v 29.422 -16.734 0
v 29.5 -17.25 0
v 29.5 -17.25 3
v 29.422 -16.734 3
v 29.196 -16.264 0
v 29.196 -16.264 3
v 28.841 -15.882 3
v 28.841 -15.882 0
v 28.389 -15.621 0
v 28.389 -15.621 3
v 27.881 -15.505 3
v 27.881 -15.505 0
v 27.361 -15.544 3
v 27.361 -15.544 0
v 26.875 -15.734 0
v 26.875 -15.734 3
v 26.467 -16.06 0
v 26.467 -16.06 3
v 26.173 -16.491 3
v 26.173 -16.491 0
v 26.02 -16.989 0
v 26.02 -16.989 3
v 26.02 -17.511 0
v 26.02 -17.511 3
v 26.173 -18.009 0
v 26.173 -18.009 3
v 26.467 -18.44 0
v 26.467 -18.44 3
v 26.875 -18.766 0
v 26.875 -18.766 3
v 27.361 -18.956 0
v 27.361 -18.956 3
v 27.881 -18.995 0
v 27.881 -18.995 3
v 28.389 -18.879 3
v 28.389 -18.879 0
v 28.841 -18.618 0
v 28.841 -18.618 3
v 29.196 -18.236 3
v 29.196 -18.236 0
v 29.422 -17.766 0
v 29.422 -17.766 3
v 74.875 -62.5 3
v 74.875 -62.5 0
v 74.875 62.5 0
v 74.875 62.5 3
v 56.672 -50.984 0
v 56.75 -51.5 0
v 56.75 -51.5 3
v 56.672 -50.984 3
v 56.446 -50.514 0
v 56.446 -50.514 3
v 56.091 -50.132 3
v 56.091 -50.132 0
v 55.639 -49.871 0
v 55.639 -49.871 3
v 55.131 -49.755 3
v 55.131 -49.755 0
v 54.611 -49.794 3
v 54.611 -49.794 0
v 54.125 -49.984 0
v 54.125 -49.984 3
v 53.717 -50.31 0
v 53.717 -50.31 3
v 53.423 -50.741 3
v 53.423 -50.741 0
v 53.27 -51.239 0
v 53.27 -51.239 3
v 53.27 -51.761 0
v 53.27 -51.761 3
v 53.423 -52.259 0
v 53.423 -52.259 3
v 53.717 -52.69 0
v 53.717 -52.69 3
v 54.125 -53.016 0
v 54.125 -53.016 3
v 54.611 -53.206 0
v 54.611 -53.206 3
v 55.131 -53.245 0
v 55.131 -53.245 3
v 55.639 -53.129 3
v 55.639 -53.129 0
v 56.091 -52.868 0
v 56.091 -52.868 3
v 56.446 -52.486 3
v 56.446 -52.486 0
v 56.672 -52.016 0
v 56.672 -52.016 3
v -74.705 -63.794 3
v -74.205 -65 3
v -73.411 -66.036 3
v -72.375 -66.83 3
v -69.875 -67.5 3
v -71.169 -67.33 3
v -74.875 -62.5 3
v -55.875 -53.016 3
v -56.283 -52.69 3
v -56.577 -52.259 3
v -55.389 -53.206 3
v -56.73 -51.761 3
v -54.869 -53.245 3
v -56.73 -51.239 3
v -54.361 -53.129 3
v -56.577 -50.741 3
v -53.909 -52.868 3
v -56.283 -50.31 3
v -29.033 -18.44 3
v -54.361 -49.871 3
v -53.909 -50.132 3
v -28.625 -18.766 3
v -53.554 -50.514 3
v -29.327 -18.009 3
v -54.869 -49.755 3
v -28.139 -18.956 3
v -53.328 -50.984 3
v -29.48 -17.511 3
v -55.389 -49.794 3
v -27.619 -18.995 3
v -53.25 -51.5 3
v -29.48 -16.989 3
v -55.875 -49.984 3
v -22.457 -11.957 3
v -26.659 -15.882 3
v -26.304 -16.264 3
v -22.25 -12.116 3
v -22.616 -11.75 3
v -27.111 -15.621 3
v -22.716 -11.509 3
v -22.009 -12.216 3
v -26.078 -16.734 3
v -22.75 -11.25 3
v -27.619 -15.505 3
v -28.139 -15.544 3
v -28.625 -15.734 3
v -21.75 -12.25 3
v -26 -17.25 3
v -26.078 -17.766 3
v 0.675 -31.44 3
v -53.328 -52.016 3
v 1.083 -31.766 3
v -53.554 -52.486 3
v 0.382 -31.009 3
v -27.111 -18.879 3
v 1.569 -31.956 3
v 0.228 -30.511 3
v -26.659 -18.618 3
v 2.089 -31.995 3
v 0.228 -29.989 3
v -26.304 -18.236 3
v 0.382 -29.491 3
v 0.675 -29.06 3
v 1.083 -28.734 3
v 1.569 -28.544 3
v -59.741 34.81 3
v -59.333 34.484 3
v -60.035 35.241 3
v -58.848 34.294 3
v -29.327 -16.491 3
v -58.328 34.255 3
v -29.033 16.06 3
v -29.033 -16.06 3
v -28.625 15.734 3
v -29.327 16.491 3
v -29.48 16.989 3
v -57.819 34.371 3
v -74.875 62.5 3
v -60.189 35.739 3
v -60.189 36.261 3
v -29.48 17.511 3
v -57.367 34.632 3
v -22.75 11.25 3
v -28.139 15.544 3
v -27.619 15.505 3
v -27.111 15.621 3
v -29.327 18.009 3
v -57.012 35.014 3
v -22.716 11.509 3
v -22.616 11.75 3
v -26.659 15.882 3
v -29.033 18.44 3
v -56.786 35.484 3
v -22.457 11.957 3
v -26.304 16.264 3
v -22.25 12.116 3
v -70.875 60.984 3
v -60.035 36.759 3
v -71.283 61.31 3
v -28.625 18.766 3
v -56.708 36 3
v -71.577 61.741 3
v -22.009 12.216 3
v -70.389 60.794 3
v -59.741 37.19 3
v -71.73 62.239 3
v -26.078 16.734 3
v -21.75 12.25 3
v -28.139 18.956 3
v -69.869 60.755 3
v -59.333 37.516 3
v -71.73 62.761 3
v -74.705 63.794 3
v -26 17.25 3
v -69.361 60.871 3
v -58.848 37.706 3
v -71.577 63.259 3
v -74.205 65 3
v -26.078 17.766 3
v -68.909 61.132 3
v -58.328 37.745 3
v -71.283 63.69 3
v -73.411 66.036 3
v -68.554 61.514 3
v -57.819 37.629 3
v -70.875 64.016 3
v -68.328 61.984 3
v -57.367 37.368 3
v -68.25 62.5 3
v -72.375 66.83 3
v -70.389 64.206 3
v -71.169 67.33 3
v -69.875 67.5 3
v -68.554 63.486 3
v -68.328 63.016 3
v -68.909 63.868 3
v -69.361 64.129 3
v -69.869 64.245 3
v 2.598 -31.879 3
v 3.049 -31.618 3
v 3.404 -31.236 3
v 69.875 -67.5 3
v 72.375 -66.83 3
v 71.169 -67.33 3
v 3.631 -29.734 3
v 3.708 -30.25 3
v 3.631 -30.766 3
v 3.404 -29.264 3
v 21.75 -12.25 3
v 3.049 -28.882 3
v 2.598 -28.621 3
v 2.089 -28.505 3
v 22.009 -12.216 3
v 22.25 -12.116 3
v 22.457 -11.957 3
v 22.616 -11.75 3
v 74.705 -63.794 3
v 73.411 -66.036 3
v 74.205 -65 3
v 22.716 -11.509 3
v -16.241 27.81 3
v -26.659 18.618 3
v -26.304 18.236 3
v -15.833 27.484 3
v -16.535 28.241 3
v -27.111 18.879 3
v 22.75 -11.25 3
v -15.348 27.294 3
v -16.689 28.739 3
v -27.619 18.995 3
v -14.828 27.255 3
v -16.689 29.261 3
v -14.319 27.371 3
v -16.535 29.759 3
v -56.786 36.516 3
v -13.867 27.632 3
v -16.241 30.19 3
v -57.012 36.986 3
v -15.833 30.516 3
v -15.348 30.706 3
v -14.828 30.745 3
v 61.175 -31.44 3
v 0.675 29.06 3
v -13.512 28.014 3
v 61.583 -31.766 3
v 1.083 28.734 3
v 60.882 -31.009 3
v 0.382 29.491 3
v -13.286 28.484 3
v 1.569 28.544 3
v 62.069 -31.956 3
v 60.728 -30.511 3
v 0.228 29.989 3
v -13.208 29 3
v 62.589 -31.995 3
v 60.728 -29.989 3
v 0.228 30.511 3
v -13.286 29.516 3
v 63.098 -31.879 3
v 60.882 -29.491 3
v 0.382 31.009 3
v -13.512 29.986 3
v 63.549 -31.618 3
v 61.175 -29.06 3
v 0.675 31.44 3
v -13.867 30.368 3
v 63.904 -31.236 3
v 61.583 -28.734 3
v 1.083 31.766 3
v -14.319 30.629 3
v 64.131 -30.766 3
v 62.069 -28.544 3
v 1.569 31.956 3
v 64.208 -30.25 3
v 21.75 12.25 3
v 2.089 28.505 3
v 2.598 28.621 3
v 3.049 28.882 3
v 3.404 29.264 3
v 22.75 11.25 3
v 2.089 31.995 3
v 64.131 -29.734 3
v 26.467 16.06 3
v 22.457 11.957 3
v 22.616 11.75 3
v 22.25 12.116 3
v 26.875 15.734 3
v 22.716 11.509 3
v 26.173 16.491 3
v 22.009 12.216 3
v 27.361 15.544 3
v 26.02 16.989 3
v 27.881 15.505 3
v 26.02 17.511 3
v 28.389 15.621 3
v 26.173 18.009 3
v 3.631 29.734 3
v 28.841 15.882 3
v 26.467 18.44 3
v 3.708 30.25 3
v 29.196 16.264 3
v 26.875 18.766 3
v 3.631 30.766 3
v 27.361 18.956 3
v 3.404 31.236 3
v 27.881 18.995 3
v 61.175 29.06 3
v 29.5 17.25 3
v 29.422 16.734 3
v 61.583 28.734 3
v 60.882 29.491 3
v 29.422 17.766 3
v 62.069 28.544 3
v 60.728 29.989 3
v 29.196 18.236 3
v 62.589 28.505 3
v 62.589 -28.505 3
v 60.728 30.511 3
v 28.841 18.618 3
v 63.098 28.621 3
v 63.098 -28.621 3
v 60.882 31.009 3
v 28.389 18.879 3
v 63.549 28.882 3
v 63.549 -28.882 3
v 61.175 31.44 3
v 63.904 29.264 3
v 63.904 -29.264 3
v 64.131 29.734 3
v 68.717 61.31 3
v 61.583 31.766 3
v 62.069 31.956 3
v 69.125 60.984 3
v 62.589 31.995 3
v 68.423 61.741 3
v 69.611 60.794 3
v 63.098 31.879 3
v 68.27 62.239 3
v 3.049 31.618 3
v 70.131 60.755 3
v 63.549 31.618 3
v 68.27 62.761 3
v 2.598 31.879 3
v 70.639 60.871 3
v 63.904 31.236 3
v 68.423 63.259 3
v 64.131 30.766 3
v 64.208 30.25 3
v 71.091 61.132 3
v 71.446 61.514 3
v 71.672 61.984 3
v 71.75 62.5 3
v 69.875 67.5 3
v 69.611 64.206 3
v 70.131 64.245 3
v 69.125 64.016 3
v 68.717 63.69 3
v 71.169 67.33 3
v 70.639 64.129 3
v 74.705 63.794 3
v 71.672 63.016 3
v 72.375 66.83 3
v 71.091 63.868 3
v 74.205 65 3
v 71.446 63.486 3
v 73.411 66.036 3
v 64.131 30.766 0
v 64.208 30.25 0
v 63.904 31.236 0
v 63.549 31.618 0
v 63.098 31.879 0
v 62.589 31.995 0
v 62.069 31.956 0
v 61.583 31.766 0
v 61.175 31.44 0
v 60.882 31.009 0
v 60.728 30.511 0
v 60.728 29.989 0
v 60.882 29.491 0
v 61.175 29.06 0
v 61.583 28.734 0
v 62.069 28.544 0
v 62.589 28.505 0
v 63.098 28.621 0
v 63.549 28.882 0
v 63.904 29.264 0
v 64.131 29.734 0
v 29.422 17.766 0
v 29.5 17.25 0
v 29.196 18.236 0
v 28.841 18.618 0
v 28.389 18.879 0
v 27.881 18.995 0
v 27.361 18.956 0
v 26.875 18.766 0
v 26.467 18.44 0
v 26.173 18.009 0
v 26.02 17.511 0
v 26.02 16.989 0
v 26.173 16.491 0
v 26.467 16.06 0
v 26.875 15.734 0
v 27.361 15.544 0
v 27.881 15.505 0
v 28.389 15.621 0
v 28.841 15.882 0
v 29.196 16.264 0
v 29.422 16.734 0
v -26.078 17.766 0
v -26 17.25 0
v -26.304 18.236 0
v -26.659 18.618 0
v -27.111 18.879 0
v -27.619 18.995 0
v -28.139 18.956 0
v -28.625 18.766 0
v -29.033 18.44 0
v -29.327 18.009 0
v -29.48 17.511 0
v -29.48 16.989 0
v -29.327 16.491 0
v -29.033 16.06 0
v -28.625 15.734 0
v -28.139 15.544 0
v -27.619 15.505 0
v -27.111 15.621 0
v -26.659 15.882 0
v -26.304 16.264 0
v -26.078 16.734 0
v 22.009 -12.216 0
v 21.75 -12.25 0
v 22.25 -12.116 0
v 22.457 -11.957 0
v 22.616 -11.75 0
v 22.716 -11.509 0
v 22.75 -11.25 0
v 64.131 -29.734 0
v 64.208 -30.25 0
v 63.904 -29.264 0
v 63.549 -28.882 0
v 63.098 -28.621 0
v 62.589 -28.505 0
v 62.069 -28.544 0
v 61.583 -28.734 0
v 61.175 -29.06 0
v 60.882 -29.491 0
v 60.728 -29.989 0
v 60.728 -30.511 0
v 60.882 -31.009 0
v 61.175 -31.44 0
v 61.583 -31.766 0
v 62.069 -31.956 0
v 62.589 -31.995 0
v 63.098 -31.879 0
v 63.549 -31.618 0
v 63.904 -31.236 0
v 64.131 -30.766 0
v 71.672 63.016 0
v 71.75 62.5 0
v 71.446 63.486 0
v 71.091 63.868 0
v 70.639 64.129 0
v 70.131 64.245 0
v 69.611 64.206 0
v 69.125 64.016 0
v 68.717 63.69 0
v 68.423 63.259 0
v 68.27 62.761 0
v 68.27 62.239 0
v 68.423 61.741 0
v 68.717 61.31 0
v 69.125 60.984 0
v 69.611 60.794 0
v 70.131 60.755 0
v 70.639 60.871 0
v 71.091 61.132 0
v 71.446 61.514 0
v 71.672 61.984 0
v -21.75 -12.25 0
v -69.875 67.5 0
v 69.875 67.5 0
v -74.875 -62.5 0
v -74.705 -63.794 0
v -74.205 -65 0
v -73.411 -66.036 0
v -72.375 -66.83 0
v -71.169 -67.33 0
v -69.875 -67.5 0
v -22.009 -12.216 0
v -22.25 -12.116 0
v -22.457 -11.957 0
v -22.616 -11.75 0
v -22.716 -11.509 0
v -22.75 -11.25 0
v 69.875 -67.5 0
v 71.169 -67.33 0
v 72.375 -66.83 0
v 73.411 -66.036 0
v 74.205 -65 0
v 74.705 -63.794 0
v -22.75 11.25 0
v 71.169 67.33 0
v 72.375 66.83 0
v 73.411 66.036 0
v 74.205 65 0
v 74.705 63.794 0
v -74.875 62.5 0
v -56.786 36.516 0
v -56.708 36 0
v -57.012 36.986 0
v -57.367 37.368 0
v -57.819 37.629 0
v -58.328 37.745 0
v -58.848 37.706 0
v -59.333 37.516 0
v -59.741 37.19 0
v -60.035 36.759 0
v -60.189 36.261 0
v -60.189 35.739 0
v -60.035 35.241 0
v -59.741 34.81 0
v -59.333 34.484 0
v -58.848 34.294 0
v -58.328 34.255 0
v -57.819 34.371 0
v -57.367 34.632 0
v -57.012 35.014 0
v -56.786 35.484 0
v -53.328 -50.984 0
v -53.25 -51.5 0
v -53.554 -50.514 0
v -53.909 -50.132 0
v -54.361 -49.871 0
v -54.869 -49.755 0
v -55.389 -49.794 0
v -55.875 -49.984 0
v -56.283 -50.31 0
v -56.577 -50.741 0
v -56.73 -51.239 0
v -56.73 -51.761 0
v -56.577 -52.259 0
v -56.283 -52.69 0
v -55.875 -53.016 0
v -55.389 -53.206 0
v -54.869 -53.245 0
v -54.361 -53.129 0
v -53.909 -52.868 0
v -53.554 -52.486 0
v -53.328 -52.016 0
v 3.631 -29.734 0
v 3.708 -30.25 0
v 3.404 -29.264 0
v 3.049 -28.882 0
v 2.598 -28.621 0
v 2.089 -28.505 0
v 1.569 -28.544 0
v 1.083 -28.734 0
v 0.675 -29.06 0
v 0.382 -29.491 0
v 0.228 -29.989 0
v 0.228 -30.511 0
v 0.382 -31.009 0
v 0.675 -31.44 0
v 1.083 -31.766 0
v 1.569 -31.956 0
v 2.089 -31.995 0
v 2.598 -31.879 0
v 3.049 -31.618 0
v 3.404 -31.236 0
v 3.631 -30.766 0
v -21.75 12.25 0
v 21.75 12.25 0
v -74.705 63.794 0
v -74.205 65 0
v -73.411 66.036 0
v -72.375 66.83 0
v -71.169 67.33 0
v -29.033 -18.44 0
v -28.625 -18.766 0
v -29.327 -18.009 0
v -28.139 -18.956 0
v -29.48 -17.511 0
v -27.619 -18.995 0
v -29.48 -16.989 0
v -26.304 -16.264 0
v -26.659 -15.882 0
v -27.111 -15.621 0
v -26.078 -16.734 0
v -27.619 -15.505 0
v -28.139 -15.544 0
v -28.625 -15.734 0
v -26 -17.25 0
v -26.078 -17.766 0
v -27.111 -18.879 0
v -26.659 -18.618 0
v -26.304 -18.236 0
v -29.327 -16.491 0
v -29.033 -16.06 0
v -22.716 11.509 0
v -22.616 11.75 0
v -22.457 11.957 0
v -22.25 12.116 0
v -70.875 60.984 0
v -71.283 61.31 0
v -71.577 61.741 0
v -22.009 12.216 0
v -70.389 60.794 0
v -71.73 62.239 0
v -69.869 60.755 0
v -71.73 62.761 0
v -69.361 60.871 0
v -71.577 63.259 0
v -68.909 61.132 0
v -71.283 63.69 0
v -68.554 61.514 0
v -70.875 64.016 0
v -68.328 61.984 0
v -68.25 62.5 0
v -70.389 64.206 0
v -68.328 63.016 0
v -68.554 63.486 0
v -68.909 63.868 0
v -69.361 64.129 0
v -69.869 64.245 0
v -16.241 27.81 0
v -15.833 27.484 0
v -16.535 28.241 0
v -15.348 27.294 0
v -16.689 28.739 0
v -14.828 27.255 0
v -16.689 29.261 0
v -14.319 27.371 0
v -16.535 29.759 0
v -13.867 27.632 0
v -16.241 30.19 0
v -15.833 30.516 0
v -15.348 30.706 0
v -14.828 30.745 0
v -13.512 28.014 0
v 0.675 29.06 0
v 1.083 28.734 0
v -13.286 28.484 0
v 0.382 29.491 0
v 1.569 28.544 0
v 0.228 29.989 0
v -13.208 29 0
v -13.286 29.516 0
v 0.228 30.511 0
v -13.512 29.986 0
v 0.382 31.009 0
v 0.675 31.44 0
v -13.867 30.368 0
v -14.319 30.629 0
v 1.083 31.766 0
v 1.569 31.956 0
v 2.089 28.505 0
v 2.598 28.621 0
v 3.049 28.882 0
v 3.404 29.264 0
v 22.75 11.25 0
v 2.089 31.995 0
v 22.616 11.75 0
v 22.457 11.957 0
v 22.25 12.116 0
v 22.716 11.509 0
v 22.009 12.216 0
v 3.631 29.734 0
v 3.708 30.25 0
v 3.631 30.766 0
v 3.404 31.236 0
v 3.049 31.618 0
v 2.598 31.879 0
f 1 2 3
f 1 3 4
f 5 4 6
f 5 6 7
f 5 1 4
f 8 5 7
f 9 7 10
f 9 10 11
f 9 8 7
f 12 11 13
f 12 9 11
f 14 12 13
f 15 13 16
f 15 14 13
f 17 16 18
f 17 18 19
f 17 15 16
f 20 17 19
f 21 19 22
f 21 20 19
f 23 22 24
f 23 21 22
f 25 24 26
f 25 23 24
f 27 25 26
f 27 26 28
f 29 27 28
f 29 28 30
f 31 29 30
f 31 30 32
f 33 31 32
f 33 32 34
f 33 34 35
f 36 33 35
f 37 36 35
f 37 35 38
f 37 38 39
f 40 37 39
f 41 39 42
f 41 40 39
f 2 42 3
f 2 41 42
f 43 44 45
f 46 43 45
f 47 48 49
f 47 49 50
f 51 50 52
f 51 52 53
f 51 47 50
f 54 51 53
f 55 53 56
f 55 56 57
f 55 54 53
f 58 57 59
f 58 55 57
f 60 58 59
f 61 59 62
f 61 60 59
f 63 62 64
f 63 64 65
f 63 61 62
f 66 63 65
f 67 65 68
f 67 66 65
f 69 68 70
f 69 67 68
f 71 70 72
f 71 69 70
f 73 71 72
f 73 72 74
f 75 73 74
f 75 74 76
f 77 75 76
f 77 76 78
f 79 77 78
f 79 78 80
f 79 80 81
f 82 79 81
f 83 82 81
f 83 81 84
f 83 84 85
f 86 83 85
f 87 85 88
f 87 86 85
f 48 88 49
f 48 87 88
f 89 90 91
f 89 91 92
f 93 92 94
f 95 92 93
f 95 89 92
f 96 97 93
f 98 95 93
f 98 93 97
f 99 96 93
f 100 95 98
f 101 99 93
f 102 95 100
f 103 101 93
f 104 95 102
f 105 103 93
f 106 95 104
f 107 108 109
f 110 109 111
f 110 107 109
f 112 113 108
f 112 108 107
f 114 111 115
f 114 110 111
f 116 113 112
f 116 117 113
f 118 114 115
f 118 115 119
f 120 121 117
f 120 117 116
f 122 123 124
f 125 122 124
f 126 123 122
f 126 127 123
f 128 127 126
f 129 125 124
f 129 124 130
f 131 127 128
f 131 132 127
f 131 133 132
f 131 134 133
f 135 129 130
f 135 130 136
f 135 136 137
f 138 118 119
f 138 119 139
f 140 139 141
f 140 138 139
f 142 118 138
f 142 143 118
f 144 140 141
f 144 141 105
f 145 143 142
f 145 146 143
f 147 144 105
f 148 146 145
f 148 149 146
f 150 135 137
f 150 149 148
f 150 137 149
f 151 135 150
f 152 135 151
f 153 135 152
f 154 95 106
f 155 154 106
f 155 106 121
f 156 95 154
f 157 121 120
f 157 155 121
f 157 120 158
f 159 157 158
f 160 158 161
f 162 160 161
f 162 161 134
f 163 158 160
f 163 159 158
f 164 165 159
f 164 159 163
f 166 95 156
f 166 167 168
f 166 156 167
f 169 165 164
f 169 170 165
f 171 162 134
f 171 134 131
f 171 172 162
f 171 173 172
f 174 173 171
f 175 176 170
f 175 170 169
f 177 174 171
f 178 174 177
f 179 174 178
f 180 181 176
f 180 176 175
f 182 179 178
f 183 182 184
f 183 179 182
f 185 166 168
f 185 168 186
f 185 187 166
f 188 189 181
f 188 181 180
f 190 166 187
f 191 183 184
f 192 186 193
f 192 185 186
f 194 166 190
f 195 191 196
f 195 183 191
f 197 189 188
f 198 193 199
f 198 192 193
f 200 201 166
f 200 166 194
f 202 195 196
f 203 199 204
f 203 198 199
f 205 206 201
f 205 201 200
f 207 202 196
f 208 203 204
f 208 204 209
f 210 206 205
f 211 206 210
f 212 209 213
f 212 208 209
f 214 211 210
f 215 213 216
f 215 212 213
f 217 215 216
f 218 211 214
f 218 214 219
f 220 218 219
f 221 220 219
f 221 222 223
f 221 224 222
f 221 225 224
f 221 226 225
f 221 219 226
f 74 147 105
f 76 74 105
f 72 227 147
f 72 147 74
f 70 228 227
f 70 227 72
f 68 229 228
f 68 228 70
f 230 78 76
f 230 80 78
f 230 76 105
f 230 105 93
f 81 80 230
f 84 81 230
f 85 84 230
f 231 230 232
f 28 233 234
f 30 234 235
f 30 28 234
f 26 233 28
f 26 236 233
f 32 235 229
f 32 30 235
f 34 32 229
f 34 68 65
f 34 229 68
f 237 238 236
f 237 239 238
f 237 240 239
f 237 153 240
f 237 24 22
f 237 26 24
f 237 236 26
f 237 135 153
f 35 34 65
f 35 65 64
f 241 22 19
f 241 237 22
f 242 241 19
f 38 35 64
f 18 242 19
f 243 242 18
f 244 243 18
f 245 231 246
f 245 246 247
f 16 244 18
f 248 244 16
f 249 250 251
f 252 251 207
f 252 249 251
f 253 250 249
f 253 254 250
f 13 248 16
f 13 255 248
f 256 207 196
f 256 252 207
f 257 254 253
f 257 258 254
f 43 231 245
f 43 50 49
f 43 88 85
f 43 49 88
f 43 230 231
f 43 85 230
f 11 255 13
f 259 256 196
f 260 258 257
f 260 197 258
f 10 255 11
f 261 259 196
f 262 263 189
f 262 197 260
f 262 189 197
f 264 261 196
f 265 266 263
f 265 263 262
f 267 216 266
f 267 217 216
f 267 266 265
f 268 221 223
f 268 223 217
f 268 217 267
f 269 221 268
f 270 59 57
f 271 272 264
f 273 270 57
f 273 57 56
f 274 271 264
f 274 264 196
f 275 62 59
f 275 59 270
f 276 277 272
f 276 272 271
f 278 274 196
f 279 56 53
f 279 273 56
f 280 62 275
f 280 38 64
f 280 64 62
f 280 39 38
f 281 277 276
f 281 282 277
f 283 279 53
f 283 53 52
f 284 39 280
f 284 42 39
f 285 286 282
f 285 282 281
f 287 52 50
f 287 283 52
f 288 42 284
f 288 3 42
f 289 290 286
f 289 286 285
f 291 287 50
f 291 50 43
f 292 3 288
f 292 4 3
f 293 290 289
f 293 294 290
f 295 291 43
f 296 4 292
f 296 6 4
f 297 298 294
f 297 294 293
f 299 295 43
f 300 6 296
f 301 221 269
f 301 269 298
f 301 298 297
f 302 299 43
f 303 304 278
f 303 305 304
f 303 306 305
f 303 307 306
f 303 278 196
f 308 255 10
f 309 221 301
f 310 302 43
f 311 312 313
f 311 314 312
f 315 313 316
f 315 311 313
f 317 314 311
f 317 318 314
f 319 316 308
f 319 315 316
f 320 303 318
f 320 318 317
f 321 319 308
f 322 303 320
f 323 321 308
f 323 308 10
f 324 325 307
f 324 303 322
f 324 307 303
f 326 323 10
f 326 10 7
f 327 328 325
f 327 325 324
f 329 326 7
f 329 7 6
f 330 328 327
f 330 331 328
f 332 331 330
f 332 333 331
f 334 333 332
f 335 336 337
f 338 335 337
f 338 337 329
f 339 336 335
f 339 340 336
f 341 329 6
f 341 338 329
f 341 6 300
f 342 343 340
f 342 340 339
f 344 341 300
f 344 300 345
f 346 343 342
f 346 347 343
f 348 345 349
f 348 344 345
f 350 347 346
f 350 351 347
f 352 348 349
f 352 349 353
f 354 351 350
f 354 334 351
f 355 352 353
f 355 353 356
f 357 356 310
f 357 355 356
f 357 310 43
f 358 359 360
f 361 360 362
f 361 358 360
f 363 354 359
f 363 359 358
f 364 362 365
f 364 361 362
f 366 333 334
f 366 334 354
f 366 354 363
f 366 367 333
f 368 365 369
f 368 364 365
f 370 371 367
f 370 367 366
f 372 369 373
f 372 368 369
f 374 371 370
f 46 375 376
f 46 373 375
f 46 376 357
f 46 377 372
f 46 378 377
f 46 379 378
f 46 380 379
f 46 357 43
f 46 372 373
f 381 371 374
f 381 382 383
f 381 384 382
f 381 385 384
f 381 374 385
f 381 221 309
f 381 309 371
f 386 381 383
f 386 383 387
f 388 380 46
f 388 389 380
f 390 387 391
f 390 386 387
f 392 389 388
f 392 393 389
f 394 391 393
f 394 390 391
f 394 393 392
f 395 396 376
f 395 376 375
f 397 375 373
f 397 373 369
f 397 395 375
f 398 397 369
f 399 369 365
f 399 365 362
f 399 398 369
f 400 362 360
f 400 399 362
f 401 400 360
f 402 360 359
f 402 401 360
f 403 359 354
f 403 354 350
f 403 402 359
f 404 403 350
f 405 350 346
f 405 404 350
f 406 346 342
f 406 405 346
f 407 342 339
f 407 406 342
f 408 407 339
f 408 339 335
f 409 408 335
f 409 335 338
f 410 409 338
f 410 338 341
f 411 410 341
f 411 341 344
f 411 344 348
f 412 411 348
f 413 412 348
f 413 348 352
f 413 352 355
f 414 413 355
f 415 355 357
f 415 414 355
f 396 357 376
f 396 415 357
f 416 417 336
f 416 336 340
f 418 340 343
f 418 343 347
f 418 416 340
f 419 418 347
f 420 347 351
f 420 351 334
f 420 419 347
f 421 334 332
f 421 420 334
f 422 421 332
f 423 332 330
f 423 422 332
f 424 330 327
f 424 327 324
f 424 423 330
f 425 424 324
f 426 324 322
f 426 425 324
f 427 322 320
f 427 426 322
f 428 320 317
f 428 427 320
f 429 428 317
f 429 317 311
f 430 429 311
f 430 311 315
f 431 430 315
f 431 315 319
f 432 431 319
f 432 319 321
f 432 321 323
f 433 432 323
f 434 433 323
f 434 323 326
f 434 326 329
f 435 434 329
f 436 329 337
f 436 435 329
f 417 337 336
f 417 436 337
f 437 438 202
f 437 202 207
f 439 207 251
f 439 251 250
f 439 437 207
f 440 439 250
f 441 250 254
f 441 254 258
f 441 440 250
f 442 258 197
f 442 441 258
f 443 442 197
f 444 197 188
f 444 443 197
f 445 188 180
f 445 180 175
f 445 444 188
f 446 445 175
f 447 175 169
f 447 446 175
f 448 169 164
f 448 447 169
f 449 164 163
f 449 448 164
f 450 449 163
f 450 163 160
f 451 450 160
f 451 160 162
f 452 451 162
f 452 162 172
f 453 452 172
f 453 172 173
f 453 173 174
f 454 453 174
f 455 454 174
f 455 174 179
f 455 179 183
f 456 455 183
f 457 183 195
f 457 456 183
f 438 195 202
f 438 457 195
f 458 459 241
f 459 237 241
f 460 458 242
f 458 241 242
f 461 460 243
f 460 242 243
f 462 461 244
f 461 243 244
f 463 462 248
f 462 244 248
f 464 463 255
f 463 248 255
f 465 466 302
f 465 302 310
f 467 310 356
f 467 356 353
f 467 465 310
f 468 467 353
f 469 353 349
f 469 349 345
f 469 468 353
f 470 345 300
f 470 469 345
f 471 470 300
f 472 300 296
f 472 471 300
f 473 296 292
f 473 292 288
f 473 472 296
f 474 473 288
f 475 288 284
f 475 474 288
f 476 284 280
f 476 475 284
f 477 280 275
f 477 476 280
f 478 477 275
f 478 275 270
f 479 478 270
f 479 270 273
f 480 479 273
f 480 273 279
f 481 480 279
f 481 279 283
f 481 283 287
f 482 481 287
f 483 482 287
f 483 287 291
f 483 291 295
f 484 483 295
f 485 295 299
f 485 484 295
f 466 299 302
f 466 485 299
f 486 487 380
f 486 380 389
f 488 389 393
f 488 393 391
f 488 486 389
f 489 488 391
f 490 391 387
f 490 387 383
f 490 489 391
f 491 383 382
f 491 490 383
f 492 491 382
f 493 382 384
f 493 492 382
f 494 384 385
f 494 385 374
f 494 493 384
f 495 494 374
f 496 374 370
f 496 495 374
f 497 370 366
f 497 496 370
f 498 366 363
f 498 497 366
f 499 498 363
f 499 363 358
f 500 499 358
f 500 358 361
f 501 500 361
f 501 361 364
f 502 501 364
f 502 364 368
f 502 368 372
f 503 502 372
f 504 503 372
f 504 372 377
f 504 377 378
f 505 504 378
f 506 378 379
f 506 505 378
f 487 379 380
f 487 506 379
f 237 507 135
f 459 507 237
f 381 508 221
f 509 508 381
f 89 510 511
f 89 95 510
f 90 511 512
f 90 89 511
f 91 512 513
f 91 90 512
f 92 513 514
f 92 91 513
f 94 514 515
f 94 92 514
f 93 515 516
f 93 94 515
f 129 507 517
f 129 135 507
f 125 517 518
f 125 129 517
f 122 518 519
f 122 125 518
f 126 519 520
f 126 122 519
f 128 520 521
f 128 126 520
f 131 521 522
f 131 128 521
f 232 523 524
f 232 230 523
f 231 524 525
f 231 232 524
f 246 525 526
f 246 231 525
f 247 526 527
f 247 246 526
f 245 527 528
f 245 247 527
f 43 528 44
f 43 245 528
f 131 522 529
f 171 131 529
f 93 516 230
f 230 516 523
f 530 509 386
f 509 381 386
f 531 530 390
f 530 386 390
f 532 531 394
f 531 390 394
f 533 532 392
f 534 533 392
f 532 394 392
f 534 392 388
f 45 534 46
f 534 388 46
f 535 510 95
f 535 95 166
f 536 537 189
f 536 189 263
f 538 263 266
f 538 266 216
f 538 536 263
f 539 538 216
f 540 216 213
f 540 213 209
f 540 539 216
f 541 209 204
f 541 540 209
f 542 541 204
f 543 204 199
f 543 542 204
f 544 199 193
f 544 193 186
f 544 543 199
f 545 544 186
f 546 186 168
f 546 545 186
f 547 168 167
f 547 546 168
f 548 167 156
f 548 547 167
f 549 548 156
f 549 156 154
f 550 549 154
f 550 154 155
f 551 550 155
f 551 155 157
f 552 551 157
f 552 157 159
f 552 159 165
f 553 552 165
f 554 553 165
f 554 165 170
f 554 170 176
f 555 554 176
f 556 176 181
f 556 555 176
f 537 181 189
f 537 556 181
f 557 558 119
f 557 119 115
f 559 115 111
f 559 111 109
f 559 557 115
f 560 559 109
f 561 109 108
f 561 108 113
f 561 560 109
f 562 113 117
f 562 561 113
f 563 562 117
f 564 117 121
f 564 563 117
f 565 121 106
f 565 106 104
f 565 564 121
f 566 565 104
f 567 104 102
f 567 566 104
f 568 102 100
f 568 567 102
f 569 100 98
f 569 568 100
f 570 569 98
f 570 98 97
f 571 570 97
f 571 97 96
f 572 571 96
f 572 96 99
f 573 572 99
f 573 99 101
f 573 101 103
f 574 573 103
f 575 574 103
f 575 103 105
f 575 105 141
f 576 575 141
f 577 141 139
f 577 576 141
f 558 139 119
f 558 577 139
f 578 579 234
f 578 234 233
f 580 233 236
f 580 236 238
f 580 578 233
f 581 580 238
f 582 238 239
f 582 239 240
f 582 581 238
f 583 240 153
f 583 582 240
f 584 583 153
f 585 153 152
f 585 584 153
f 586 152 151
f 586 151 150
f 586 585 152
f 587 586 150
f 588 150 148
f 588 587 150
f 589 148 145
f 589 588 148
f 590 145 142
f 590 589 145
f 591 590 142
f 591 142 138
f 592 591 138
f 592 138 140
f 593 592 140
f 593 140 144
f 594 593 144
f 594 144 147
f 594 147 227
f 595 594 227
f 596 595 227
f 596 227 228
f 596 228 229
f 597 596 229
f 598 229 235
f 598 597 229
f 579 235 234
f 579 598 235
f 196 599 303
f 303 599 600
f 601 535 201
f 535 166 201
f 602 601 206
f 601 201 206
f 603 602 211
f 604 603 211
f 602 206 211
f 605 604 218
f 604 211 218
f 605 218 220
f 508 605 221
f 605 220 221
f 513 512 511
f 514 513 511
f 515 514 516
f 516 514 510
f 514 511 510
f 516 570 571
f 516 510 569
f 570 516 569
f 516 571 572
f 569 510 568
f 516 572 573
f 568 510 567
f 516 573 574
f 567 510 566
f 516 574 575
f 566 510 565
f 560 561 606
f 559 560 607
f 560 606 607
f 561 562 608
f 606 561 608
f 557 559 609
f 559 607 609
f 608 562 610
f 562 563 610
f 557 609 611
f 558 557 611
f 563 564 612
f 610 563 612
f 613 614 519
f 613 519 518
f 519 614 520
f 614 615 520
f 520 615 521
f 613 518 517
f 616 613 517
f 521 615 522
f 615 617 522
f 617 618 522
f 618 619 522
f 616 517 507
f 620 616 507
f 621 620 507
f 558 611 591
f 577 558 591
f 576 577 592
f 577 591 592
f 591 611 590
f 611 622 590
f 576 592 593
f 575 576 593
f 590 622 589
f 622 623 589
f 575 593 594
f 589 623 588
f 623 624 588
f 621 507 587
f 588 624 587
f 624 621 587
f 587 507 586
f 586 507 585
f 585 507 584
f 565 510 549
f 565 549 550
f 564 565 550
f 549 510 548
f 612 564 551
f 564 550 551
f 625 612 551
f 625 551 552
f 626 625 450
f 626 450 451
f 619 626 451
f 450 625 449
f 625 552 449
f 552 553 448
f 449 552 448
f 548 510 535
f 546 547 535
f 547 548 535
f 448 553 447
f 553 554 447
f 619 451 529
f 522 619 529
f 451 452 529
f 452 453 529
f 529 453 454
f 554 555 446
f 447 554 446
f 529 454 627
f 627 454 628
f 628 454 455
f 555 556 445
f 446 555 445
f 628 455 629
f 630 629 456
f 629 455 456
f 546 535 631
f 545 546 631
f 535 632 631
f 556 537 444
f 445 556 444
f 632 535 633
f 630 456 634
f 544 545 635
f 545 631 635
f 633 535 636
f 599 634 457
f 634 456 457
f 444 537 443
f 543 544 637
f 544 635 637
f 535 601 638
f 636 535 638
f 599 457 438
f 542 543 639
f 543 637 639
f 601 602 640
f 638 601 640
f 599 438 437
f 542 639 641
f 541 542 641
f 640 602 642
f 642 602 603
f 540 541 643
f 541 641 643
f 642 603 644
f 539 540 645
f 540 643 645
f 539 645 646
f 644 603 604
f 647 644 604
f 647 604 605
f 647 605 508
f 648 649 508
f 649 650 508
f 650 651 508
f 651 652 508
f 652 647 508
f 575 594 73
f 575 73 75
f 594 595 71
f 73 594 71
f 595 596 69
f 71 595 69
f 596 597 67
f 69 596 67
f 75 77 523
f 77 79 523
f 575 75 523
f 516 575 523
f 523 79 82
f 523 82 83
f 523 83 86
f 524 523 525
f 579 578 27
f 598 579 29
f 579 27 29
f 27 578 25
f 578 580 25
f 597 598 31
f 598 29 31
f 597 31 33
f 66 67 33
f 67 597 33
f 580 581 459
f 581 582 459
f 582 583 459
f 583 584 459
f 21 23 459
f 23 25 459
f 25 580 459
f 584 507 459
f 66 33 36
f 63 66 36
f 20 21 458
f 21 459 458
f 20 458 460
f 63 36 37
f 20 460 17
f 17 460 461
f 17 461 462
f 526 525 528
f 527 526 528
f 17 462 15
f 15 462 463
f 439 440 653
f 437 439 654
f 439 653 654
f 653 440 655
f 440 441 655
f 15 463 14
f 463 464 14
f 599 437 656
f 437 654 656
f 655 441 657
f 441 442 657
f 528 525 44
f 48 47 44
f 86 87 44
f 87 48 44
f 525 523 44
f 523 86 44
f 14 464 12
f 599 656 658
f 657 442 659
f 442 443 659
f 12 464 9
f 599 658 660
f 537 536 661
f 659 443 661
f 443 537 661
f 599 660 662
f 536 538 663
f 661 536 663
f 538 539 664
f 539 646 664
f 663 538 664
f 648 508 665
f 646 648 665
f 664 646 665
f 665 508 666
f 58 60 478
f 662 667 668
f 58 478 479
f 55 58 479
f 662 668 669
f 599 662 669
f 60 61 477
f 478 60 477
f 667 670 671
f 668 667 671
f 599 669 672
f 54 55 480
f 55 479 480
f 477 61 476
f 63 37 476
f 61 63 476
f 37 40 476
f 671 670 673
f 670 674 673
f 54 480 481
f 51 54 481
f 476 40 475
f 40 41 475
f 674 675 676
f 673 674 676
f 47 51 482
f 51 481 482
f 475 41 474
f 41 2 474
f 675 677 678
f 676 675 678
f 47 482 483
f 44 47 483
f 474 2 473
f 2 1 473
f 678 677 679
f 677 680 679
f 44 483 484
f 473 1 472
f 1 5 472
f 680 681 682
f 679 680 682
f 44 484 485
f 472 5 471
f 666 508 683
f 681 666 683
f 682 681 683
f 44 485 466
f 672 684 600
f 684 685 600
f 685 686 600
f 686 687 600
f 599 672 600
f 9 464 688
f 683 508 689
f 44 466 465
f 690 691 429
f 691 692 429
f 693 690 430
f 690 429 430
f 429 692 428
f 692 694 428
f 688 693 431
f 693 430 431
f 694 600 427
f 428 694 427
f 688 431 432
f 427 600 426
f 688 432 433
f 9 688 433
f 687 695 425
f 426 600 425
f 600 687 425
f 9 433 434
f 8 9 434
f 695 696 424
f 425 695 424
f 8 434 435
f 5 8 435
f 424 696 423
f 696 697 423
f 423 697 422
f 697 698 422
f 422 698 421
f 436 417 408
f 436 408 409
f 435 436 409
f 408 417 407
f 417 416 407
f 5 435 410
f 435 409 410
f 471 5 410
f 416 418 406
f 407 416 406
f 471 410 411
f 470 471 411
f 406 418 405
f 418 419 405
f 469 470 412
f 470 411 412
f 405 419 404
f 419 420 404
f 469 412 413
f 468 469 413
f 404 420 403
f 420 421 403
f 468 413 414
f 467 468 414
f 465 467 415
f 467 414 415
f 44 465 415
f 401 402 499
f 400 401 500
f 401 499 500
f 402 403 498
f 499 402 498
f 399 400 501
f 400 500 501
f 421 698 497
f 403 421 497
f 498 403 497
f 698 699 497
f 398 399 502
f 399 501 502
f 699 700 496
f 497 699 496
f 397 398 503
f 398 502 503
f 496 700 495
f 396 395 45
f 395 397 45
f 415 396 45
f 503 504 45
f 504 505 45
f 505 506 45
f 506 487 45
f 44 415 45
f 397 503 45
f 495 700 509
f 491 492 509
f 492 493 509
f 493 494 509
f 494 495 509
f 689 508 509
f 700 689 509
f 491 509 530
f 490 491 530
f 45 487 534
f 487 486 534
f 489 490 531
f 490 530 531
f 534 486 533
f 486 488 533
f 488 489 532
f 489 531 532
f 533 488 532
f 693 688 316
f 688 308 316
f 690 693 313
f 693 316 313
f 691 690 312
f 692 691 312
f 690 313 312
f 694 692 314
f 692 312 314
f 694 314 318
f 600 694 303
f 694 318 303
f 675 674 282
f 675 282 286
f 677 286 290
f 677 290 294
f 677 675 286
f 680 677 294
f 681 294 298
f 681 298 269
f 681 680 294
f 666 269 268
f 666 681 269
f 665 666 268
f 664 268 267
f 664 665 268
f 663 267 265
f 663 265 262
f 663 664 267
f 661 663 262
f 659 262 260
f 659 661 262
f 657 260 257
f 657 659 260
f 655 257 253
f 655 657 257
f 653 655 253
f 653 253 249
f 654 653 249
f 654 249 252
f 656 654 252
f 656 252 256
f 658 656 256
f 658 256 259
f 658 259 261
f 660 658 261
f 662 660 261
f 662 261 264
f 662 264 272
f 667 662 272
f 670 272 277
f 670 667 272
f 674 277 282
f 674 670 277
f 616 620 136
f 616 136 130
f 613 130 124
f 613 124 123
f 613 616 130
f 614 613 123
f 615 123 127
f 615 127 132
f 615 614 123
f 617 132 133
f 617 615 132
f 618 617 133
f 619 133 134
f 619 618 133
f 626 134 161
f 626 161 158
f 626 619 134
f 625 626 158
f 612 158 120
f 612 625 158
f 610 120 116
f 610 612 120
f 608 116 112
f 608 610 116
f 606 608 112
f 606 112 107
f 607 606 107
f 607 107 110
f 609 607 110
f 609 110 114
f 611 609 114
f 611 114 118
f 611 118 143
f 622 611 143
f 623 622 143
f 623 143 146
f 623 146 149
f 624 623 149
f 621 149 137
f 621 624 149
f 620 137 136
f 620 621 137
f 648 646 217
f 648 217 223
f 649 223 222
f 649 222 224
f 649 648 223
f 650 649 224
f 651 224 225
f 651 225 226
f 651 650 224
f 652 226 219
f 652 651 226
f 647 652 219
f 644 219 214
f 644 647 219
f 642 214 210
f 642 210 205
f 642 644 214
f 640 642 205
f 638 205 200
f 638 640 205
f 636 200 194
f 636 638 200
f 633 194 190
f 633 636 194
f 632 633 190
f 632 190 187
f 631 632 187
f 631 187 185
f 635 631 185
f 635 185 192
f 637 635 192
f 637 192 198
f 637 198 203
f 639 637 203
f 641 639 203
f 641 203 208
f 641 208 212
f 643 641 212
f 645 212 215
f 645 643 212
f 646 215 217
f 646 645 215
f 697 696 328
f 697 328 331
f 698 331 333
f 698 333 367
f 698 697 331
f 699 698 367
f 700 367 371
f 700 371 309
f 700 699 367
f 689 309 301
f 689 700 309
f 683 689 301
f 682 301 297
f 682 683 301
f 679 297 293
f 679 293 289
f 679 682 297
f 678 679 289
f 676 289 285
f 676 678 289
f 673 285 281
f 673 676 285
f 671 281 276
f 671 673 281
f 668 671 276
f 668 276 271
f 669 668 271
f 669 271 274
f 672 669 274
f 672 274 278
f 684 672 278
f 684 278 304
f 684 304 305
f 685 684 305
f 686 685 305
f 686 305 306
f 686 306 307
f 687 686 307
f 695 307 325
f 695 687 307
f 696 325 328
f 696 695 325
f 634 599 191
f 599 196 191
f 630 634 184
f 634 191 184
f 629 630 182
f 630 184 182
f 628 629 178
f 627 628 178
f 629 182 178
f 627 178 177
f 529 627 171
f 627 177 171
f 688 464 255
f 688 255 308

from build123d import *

# Parameters (mm, degrees)
ESQUISSE1_W        = 149.75
ESQUISSE1_H        = 135
ESQUISSE1_R        = 1.75
ESQUISSE1_W_2      = 45.5
ESQUISSE1_H_2      = 24.5
BOSS_EXTRU_1_DEPTH = 3
CONG_1_R           = 5
CONG_2_R           = 1


with BuildPart() as part:
    # Esquisse1 → Boss.-Extru.1 (new body)
    with BuildSketch(Plane.XY):
        Rectangle(ESQUISSE1_W, ESQUISSE1_H)
        with Locations((-70, 62.5)):
            Circle(ESQUISSE1_R, mode=Mode.SUBTRACT)
        with Locations((70, 62.5)):
            Circle(ESQUISSE1_R, mode=Mode.SUBTRACT)
        with Locations((55, -51.5)):
            Circle(ESQUISSE1_R, mode=Mode.SUBTRACT)
        with Locations((-55, -51.5)):
            Circle(ESQUISSE1_R, mode=Mode.SUBTRACT)
        with Locations((-58.458333333, 36)):
            Circle(ESQUISSE1_R, mode=Mode.SUBTRACT)
        with Locations((-14.958333333, 29)):
            Circle(ESQUISSE1_R, mode=Mode.SUBTRACT)
        with Locations((1.958333333, 30.25)):
            Circle(ESQUISSE1_R, mode=Mode.SUBTRACT)
        with Locations((62.458333333, 30.25)):
            Circle(ESQUISSE1_R, mode=Mode.SUBTRACT)
        with Locations((62.458333333, -30.25)):
            Circle(ESQUISSE1_R, mode=Mode.SUBTRACT)
        with Locations((1.958333333, -30.25)):
            Circle(ESQUISSE1_R, mode=Mode.SUBTRACT)
        with Locations((-27.75, 17.25)):
            Circle(ESQUISSE1_R, mode=Mode.SUBTRACT)
        with Locations((27.75, 17.25)):
            Circle(ESQUISSE1_R, mode=Mode.SUBTRACT)
        with Locations((27.75, -17.25)):
            Circle(ESQUISSE1_R, mode=Mode.SUBTRACT)
        with Locations((-27.75, -17.25)):
            Circle(ESQUISSE1_R, mode=Mode.SUBTRACT)
        Rectangle(ESQUISSE1_W_2, ESQUISSE1_H_2, mode=Mode.SUBTRACT)
    extrude(amount=BOSS_EXTRU_1_DEPTH)

    # Congé1
    cong_1_edges = [part.edges().sort_by_distance(p)[0] for p in [
        (-74.875, 67.5, 1.5),
        (74.875, 67.5, 1.5),
        (74.875, -67.5, 1.5),
        (-74.875, -67.5, 1.5),
    ]]
    fillet(cong_1_edges, radius=CONG_1_R)

    # Congé2
    cong_2_edges = [part.edges().sort_by_distance(p)[0] for p in [
        (-22.75, 12.25, 1.5),
        (-22.75, -12.25, 1.5),
        (22.75, -12.25, 1.5),
        (22.75, 12.25, 1.5),
    ]]
    fillet(cong_2_edges, radius=CONG_2_R)


solid = part.part
